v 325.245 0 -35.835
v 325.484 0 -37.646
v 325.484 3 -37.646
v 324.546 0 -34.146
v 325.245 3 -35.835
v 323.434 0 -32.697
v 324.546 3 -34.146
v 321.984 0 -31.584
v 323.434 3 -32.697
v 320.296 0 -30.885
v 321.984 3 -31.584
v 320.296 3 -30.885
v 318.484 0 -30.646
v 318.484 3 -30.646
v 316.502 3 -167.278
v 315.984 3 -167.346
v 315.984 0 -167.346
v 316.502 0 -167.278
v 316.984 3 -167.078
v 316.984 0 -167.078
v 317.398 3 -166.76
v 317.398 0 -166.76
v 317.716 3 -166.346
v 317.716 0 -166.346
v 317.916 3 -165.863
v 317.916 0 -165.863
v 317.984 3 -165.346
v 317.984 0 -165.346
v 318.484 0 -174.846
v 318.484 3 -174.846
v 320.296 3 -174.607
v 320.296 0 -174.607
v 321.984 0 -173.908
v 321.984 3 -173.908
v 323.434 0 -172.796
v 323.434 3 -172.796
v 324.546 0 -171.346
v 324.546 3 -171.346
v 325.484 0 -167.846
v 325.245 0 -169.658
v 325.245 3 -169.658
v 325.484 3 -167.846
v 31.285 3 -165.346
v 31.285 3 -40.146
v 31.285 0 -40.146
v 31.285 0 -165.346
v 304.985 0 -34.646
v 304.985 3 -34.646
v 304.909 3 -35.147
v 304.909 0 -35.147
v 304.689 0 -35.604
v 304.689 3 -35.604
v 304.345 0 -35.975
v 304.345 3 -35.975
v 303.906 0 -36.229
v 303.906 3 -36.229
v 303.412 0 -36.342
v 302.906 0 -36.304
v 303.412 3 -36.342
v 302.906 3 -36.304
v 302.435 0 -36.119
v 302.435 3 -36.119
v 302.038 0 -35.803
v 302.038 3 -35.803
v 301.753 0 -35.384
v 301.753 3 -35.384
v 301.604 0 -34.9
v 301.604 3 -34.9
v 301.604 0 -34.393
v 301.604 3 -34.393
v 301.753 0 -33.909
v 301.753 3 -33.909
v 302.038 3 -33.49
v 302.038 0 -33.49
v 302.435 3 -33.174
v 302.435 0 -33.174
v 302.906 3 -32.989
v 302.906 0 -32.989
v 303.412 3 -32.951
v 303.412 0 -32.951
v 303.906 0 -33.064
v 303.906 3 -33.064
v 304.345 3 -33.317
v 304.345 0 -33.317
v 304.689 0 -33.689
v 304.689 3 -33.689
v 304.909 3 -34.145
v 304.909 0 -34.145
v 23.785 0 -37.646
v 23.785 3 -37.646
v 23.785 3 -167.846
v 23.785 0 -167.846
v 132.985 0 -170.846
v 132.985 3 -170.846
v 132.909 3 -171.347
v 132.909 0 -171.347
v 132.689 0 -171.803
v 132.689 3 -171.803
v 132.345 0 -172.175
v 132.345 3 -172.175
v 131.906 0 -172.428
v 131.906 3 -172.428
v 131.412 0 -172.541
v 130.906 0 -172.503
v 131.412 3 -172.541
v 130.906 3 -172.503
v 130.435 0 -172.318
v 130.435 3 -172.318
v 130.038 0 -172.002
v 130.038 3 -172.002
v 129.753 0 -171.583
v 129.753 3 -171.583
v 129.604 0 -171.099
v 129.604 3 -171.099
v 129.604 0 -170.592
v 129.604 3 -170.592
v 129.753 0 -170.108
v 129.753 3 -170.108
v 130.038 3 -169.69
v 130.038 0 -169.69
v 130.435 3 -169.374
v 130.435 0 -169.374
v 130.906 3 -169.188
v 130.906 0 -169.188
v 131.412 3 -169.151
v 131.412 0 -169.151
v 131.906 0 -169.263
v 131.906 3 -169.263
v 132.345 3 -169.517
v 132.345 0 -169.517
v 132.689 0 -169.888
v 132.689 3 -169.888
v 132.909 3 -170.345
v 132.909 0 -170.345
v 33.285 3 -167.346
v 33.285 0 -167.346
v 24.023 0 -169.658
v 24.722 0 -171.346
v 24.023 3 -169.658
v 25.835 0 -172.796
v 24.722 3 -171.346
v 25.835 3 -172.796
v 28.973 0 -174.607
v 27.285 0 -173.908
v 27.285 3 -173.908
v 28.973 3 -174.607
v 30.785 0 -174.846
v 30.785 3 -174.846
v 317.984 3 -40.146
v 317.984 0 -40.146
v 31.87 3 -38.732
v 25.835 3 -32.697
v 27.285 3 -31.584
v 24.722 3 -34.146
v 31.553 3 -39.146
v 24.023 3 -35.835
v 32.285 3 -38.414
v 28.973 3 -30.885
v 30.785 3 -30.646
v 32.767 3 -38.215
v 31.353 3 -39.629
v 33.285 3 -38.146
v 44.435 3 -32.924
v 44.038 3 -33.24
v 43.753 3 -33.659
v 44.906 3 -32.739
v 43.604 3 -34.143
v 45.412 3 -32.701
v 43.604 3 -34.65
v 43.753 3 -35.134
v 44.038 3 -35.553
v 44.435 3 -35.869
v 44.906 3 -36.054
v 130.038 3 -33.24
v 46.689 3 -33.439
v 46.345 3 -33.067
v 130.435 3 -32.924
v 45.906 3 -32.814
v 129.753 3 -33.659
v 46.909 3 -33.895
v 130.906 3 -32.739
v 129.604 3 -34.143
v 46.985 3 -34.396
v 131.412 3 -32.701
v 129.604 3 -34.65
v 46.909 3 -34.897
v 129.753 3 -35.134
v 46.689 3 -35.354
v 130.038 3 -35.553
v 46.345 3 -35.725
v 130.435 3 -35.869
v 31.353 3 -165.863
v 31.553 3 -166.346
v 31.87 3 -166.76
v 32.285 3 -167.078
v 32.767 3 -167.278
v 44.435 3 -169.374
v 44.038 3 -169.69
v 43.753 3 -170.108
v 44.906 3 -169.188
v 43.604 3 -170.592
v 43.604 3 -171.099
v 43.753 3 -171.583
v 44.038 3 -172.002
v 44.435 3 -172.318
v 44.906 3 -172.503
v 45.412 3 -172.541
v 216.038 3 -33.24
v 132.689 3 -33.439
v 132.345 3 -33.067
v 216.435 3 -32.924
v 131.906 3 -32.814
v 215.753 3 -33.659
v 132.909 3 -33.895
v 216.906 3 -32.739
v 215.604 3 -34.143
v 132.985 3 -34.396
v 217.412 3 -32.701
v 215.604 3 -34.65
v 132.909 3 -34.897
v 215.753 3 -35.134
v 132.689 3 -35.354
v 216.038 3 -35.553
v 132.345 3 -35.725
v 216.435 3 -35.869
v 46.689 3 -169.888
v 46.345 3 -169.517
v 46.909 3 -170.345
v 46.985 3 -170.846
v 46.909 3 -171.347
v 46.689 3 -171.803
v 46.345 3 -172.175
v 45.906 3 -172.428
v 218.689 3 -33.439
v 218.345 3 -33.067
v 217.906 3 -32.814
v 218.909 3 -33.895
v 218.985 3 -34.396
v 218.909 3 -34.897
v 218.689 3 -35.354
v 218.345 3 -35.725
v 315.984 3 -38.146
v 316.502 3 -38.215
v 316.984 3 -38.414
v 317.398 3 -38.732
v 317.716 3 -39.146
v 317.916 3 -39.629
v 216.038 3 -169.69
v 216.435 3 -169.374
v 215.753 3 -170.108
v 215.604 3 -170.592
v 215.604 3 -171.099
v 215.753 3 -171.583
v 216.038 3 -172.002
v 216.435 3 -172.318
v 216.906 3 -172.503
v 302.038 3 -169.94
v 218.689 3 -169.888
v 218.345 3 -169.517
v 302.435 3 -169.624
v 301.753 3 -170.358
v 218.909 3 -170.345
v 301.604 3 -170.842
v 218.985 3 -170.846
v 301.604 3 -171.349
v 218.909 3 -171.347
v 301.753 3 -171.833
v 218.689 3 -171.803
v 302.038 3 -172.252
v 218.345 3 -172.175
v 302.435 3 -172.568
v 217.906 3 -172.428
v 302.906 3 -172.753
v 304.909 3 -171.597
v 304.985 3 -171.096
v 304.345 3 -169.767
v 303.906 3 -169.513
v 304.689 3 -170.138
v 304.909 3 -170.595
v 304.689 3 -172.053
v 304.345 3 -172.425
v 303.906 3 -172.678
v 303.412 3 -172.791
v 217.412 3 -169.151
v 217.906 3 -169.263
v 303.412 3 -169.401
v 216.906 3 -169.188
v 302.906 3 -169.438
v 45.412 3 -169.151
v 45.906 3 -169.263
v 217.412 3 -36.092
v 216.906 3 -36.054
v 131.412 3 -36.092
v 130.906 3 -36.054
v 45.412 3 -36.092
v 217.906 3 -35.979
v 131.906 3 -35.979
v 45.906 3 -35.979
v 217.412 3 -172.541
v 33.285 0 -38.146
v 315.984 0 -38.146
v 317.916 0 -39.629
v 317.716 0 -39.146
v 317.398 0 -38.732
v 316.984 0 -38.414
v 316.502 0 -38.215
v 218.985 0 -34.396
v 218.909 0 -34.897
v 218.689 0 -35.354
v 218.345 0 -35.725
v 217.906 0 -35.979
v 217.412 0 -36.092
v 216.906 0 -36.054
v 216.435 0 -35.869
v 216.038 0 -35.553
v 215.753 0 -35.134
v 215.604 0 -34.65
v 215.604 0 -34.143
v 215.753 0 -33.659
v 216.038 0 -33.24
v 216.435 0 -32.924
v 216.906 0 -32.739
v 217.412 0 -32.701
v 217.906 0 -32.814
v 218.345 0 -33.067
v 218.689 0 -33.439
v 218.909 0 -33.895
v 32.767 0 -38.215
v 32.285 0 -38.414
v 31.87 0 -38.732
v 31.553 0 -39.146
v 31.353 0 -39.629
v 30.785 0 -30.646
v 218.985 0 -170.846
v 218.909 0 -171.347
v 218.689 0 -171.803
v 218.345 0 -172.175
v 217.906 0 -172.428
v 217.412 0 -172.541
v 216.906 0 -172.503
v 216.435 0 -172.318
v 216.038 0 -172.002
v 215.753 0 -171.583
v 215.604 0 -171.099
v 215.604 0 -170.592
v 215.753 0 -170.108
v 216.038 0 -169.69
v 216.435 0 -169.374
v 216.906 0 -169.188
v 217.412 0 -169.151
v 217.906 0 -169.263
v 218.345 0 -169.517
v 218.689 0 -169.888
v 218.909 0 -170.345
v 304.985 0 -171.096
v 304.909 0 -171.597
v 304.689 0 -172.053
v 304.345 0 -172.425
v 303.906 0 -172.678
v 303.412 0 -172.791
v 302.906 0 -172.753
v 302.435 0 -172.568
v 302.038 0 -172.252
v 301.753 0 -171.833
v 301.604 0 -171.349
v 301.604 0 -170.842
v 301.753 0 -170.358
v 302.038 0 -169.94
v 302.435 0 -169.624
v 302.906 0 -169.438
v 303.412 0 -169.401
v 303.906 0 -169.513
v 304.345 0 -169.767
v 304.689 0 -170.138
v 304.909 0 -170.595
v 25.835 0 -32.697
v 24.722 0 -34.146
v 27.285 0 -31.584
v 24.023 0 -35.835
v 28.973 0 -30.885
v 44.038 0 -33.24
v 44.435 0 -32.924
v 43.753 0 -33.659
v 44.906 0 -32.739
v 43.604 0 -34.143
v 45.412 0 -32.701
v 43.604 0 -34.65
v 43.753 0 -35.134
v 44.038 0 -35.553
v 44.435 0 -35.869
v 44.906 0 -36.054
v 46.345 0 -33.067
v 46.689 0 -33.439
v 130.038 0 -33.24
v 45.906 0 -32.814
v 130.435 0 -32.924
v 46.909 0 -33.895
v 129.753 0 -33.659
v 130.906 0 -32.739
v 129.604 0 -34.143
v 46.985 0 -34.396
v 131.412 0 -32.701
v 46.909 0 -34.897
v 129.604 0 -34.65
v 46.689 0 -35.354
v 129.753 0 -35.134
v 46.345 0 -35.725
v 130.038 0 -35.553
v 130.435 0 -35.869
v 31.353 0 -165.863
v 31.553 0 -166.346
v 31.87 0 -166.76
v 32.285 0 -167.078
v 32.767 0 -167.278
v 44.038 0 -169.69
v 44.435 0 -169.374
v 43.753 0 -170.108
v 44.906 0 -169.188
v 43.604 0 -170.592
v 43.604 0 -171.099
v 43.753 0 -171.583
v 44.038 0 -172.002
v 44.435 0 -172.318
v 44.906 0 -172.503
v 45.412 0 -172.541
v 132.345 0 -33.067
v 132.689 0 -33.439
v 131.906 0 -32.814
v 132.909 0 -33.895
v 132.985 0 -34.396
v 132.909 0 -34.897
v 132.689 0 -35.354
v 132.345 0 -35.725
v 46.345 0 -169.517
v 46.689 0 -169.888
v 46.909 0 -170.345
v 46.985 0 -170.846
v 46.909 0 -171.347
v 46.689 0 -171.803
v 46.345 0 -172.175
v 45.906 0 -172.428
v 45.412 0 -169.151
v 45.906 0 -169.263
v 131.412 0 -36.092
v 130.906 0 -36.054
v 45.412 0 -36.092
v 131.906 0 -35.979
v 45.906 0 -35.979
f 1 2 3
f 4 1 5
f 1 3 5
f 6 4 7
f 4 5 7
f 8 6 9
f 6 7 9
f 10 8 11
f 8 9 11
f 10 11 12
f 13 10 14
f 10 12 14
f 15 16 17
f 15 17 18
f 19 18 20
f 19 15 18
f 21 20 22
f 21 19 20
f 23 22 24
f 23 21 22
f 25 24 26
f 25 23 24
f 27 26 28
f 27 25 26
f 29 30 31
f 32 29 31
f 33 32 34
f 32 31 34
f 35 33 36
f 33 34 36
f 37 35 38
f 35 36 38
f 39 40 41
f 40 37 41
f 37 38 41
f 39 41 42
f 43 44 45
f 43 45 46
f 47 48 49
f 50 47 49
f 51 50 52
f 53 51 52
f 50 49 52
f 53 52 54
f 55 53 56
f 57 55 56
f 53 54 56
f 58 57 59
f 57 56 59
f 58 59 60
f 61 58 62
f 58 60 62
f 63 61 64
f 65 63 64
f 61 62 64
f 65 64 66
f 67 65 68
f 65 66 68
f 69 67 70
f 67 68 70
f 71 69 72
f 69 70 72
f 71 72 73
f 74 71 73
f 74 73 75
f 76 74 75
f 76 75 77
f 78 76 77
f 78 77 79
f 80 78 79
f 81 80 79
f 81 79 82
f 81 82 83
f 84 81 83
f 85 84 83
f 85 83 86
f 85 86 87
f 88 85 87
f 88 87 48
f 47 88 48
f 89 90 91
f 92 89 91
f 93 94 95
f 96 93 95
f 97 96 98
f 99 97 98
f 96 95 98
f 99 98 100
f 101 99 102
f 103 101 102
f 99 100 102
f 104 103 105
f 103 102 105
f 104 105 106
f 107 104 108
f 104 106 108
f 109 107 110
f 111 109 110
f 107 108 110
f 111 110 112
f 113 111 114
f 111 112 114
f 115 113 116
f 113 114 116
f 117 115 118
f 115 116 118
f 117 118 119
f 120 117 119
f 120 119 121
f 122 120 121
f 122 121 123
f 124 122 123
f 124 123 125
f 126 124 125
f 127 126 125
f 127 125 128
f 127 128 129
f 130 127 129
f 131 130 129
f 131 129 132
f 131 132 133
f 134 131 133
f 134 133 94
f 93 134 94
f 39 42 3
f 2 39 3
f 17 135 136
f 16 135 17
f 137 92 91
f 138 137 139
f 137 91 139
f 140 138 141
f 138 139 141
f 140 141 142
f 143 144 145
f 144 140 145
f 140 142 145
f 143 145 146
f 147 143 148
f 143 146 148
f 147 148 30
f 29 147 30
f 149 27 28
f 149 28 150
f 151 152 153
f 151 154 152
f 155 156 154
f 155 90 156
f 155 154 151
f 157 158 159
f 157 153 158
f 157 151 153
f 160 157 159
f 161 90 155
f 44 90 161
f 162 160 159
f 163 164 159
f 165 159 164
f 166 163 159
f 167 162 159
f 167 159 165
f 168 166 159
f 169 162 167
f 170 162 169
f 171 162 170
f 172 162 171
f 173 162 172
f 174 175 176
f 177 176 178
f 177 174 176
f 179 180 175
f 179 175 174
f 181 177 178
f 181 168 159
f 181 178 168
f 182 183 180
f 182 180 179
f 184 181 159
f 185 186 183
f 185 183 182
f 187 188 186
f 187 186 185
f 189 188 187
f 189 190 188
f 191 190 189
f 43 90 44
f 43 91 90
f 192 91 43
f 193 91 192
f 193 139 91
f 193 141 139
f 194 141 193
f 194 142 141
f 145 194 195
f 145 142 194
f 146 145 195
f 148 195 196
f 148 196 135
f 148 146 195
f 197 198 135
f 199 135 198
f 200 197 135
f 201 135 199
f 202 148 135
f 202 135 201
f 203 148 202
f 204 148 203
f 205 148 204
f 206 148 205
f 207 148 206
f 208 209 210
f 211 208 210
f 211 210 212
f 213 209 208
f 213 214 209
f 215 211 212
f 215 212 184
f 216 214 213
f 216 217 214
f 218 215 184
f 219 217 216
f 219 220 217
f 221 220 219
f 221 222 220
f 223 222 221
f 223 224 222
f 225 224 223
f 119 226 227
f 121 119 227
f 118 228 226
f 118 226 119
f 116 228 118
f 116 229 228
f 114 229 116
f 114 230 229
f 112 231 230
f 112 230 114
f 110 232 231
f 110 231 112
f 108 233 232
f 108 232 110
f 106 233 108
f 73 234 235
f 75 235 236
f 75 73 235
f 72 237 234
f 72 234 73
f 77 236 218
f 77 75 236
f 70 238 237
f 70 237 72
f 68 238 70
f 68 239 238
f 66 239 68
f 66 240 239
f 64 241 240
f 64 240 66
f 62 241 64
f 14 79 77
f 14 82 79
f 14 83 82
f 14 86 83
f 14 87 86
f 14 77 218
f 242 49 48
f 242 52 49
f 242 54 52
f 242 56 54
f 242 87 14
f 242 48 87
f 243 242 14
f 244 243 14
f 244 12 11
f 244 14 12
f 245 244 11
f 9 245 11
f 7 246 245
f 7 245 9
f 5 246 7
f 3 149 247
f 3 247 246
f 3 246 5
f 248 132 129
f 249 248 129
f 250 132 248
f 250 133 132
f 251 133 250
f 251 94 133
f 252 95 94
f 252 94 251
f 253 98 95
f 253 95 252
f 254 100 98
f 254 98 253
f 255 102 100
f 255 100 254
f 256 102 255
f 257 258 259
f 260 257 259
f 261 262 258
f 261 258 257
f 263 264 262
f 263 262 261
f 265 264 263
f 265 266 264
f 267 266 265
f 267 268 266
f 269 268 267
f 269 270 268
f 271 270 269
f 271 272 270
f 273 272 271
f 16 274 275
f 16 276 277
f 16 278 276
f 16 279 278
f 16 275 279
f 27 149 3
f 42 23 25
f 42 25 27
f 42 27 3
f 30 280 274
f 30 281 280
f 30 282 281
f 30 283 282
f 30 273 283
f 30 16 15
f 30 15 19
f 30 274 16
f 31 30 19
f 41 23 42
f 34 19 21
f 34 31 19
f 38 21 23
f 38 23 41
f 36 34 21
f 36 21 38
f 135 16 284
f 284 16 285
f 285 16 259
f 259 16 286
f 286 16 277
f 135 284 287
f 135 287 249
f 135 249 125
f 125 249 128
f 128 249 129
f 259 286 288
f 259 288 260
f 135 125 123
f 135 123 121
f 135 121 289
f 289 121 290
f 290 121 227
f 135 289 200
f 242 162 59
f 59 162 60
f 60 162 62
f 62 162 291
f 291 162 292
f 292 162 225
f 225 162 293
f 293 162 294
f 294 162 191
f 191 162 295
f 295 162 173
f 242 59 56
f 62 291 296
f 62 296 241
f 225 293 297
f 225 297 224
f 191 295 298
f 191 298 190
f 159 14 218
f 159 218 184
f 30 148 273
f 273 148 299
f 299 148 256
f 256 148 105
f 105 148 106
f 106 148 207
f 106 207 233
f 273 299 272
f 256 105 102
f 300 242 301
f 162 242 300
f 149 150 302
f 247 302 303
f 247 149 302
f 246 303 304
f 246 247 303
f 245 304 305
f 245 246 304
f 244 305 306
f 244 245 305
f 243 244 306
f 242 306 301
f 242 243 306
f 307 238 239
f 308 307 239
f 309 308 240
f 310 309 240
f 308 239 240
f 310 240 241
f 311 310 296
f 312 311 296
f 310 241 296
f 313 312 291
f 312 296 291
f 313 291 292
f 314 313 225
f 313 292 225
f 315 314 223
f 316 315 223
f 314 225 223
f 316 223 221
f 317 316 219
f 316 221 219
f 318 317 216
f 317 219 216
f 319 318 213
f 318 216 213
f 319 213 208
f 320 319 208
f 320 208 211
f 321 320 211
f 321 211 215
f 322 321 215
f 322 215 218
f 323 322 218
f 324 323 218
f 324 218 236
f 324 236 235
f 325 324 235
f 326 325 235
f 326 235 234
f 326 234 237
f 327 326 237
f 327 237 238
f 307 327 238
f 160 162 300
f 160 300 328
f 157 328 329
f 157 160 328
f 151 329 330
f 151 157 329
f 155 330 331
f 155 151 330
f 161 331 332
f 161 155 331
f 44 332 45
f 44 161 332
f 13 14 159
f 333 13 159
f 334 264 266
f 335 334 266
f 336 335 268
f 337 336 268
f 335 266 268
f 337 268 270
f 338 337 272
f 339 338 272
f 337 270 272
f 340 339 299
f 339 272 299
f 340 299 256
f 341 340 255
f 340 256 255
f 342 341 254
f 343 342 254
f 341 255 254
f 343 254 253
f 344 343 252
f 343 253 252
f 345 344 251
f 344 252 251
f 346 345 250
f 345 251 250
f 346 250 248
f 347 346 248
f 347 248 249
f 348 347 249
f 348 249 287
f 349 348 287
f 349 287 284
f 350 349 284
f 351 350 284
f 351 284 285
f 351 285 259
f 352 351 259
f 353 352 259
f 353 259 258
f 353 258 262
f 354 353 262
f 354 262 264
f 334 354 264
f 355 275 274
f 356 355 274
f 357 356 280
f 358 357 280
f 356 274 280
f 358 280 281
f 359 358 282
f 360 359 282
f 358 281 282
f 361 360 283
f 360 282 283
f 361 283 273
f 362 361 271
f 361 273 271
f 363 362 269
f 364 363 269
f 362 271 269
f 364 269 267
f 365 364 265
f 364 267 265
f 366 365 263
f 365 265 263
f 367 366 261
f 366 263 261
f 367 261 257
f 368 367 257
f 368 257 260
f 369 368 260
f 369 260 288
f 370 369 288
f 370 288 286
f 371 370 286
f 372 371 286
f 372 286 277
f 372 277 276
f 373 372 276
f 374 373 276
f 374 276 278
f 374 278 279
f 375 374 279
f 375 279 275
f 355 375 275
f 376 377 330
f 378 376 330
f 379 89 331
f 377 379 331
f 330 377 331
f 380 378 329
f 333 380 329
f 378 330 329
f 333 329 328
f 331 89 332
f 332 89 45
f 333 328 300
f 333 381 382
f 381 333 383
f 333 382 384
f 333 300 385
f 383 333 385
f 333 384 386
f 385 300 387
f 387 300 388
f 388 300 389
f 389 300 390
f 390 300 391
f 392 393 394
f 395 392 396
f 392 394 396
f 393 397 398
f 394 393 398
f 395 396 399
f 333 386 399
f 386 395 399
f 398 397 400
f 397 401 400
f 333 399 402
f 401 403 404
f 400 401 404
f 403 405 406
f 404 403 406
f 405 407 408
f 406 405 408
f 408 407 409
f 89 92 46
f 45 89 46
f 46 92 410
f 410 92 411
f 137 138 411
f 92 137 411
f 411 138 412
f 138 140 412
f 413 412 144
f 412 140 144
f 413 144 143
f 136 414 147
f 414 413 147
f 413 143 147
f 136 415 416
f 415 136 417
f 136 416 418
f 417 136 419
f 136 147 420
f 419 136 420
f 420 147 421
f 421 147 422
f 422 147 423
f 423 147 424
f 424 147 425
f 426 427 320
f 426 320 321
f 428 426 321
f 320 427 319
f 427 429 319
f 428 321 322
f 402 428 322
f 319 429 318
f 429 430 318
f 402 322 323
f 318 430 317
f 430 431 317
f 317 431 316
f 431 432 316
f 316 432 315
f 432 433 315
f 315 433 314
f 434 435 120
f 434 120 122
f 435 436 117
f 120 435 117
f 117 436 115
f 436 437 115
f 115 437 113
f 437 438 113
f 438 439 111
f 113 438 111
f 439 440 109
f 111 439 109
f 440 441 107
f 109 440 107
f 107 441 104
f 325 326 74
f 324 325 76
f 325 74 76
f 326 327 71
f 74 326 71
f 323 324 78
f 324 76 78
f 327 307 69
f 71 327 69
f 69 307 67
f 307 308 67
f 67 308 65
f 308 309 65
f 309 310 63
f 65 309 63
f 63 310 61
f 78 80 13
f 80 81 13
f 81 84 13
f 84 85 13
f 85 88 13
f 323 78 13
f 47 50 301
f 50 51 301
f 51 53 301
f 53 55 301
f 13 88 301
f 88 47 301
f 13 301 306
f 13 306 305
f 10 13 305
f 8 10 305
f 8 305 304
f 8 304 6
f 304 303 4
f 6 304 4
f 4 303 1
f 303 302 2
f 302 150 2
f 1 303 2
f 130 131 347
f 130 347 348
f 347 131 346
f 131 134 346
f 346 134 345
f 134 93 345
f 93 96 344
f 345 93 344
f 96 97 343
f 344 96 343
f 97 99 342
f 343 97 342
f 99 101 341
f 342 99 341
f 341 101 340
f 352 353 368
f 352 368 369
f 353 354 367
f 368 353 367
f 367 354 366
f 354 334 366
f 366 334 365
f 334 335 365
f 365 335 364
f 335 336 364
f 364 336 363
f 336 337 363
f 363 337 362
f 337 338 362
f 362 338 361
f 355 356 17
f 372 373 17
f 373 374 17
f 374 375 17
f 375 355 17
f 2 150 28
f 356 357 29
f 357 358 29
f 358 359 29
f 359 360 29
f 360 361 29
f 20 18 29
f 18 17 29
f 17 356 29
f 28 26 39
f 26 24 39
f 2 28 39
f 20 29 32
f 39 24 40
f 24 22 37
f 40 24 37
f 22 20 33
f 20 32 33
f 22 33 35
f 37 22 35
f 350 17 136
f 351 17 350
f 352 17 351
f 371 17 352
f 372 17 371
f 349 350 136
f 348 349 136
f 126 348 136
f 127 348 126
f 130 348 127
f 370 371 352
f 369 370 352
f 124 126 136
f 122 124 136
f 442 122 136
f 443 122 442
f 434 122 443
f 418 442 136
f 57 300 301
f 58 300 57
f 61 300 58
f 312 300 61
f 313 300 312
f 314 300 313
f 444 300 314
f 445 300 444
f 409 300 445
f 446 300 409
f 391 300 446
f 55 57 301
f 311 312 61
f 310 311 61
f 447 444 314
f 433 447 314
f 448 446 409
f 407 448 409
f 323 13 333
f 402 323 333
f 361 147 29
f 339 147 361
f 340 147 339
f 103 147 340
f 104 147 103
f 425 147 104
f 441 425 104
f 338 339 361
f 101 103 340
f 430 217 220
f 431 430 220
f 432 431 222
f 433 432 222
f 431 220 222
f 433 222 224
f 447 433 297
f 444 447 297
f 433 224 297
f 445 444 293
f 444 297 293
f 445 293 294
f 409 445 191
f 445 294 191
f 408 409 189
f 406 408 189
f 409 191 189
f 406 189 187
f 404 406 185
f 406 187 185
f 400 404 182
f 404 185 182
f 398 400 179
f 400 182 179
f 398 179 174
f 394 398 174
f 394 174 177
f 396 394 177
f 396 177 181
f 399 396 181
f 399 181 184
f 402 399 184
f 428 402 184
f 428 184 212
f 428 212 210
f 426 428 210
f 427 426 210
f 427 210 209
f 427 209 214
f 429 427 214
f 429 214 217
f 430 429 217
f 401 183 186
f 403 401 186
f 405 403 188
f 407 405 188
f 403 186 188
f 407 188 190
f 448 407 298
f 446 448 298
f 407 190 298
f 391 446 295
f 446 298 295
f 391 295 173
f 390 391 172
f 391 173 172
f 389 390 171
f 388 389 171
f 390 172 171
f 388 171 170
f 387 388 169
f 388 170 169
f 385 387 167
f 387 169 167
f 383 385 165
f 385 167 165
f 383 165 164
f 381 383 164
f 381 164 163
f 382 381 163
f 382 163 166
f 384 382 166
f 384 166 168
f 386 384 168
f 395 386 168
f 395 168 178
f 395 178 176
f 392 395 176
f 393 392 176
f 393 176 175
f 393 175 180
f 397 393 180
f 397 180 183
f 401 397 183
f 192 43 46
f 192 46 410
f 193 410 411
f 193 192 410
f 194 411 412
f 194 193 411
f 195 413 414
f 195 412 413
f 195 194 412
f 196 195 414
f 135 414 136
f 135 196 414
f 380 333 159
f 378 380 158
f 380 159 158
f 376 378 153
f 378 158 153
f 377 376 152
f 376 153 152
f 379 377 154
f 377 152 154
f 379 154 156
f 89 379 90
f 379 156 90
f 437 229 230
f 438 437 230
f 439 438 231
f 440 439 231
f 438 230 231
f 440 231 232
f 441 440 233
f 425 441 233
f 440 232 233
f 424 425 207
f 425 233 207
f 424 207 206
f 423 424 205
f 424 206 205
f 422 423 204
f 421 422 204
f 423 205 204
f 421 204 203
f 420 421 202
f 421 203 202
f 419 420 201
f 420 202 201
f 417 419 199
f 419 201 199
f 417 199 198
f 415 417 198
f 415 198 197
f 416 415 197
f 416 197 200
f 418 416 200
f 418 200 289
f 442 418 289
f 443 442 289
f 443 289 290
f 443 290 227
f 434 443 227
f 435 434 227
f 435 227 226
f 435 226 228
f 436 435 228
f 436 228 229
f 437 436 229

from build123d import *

# Parameters (mm, degrees)
SKETCH1_W           = 350
SKETCH1_H           = 200
BOSS_EXTRUDE1_DEPTH = 3
SKETCH2_OUTSIDE_W   = 432.624
SKETCH2_OUTSIDE_H   = 282.624
SKETCH2_OUTSIDE_R   = 1.7
CUT_EXTRUDE1_DEPTH  = 10


with BuildPart() as part:
    # Sketch1 → Boss-Extrude1 (new body)
    with BuildSketch(Plane(origin=(0, 0, 0), x_dir=(1, 0, 0), z_dir=(0, 1, 0))):
        with Locations((175, 100)):
            Rectangle(SKETCH1_W, SKETCH1_H)
    extrude(amount=BOSS_EXTRUDE1_DEPTH)

    # Sketch2 outside → Cut-Extrude1 (cut)
    with BuildSketch(Plane(origin=(0, 3, 0), x_dir=(1, 0, 0), z_dir=(0, 1, 0))):
        with Locations((175, 100)):
            Rectangle(SKETCH2_OUTSIDE_W, SKETCH2_OUTSIDE_H)
        with BuildLine():
            Line((23.784579293, 37.646381187), (23.784579293, 167.845841187))
            ThreePointArc((23.784579293, 167.845841187), (25.834831825, 172.795588656), (30.784579293, 174.845841187))
            Line((30.784579293, 174.845841187), (318.483929293, 174.845841187))
            ThreePointArc((318.483929293, 174.845841187), (323.433676762, 172.795588656), (325.483929293, 167.845841187))
            Line((325.483929293, 167.845841187), (325.483929293, 37.646381187))
            ThreePointArc((325.483929293, 37.646381187), (323.433676762, 32.696633719), (318.483929293, 30.646381187))
            Line((318.483929293, 30.646381187), (30.784579293, 30.646381187))
            ThreePointArc((30.784579293, 30.646381187), (25.834831825, 32.696633719), (23.784579293, 37.646381187))
        make_face(mode=Mode.SUBTRACT)
        with Locations((303.284579293, 34.646381187)):
            Circle(SKETCH2_OUTSIDE_R)
        with Locations((217.284579293, 34.396381187)):
            Circle(SKETCH2_OUTSIDE_R)
        with Locations((45.284579293, 34.396381187)):
            Circle(SKETCH2_OUTSIDE_R)
        with Locations((131.284579293, 34.396381187)):
            Circle(SKETCH2_OUTSIDE_R)
        with Locations((303.284579293, 171.095841187)):
            Circle(SKETCH2_OUTSIDE_R)
        with Locations((217.284579293, 170.845841187)):
            Circle(SKETCH2_OUTSIDE_R)
        with Locations((45.284579293, 170.845841187)):
            Circle(SKETCH2_OUTSIDE_R)
        with Locations((131.284579293, 170.845841187)):
            Circle(SKETCH2_OUTSIDE_R)
        with BuildLine():
            Line((33.284579293, 167.345841187), (315.983929293, 167.345841187))
            ThreePointArc((315.983929293, 167.345841187), (317.398142856, 166.76005475), (317.983929293, 165.345841187))
            Line((317.983929293, 165.345841187), (317.983929293, 40.146381187))
            ThreePointArc((317.983929293, 40.146381187), (317.398142856, 38.732167625), (315.983929293, 38.146381187))
            Line((315.983929293, 38.146381187), (33.284579293, 38.146381187))
            ThreePointArc((33.284579293, 38.146381187), (31.870365731, 38.732167625), (31.284579293, 40.146381187))
            Line((31.284579293, 40.146381187), (31.284579293, 165.345841187))
            ThreePointArc((31.284579293, 165.345841187), (31.870365731, 166.76005475), (33.284579293, 167.345841187))
        make_face()
    extrude(amount=-CUT_EXTRUDE1_DEPTH, mode=Mode.SUBTRACT)


solid = part.part
